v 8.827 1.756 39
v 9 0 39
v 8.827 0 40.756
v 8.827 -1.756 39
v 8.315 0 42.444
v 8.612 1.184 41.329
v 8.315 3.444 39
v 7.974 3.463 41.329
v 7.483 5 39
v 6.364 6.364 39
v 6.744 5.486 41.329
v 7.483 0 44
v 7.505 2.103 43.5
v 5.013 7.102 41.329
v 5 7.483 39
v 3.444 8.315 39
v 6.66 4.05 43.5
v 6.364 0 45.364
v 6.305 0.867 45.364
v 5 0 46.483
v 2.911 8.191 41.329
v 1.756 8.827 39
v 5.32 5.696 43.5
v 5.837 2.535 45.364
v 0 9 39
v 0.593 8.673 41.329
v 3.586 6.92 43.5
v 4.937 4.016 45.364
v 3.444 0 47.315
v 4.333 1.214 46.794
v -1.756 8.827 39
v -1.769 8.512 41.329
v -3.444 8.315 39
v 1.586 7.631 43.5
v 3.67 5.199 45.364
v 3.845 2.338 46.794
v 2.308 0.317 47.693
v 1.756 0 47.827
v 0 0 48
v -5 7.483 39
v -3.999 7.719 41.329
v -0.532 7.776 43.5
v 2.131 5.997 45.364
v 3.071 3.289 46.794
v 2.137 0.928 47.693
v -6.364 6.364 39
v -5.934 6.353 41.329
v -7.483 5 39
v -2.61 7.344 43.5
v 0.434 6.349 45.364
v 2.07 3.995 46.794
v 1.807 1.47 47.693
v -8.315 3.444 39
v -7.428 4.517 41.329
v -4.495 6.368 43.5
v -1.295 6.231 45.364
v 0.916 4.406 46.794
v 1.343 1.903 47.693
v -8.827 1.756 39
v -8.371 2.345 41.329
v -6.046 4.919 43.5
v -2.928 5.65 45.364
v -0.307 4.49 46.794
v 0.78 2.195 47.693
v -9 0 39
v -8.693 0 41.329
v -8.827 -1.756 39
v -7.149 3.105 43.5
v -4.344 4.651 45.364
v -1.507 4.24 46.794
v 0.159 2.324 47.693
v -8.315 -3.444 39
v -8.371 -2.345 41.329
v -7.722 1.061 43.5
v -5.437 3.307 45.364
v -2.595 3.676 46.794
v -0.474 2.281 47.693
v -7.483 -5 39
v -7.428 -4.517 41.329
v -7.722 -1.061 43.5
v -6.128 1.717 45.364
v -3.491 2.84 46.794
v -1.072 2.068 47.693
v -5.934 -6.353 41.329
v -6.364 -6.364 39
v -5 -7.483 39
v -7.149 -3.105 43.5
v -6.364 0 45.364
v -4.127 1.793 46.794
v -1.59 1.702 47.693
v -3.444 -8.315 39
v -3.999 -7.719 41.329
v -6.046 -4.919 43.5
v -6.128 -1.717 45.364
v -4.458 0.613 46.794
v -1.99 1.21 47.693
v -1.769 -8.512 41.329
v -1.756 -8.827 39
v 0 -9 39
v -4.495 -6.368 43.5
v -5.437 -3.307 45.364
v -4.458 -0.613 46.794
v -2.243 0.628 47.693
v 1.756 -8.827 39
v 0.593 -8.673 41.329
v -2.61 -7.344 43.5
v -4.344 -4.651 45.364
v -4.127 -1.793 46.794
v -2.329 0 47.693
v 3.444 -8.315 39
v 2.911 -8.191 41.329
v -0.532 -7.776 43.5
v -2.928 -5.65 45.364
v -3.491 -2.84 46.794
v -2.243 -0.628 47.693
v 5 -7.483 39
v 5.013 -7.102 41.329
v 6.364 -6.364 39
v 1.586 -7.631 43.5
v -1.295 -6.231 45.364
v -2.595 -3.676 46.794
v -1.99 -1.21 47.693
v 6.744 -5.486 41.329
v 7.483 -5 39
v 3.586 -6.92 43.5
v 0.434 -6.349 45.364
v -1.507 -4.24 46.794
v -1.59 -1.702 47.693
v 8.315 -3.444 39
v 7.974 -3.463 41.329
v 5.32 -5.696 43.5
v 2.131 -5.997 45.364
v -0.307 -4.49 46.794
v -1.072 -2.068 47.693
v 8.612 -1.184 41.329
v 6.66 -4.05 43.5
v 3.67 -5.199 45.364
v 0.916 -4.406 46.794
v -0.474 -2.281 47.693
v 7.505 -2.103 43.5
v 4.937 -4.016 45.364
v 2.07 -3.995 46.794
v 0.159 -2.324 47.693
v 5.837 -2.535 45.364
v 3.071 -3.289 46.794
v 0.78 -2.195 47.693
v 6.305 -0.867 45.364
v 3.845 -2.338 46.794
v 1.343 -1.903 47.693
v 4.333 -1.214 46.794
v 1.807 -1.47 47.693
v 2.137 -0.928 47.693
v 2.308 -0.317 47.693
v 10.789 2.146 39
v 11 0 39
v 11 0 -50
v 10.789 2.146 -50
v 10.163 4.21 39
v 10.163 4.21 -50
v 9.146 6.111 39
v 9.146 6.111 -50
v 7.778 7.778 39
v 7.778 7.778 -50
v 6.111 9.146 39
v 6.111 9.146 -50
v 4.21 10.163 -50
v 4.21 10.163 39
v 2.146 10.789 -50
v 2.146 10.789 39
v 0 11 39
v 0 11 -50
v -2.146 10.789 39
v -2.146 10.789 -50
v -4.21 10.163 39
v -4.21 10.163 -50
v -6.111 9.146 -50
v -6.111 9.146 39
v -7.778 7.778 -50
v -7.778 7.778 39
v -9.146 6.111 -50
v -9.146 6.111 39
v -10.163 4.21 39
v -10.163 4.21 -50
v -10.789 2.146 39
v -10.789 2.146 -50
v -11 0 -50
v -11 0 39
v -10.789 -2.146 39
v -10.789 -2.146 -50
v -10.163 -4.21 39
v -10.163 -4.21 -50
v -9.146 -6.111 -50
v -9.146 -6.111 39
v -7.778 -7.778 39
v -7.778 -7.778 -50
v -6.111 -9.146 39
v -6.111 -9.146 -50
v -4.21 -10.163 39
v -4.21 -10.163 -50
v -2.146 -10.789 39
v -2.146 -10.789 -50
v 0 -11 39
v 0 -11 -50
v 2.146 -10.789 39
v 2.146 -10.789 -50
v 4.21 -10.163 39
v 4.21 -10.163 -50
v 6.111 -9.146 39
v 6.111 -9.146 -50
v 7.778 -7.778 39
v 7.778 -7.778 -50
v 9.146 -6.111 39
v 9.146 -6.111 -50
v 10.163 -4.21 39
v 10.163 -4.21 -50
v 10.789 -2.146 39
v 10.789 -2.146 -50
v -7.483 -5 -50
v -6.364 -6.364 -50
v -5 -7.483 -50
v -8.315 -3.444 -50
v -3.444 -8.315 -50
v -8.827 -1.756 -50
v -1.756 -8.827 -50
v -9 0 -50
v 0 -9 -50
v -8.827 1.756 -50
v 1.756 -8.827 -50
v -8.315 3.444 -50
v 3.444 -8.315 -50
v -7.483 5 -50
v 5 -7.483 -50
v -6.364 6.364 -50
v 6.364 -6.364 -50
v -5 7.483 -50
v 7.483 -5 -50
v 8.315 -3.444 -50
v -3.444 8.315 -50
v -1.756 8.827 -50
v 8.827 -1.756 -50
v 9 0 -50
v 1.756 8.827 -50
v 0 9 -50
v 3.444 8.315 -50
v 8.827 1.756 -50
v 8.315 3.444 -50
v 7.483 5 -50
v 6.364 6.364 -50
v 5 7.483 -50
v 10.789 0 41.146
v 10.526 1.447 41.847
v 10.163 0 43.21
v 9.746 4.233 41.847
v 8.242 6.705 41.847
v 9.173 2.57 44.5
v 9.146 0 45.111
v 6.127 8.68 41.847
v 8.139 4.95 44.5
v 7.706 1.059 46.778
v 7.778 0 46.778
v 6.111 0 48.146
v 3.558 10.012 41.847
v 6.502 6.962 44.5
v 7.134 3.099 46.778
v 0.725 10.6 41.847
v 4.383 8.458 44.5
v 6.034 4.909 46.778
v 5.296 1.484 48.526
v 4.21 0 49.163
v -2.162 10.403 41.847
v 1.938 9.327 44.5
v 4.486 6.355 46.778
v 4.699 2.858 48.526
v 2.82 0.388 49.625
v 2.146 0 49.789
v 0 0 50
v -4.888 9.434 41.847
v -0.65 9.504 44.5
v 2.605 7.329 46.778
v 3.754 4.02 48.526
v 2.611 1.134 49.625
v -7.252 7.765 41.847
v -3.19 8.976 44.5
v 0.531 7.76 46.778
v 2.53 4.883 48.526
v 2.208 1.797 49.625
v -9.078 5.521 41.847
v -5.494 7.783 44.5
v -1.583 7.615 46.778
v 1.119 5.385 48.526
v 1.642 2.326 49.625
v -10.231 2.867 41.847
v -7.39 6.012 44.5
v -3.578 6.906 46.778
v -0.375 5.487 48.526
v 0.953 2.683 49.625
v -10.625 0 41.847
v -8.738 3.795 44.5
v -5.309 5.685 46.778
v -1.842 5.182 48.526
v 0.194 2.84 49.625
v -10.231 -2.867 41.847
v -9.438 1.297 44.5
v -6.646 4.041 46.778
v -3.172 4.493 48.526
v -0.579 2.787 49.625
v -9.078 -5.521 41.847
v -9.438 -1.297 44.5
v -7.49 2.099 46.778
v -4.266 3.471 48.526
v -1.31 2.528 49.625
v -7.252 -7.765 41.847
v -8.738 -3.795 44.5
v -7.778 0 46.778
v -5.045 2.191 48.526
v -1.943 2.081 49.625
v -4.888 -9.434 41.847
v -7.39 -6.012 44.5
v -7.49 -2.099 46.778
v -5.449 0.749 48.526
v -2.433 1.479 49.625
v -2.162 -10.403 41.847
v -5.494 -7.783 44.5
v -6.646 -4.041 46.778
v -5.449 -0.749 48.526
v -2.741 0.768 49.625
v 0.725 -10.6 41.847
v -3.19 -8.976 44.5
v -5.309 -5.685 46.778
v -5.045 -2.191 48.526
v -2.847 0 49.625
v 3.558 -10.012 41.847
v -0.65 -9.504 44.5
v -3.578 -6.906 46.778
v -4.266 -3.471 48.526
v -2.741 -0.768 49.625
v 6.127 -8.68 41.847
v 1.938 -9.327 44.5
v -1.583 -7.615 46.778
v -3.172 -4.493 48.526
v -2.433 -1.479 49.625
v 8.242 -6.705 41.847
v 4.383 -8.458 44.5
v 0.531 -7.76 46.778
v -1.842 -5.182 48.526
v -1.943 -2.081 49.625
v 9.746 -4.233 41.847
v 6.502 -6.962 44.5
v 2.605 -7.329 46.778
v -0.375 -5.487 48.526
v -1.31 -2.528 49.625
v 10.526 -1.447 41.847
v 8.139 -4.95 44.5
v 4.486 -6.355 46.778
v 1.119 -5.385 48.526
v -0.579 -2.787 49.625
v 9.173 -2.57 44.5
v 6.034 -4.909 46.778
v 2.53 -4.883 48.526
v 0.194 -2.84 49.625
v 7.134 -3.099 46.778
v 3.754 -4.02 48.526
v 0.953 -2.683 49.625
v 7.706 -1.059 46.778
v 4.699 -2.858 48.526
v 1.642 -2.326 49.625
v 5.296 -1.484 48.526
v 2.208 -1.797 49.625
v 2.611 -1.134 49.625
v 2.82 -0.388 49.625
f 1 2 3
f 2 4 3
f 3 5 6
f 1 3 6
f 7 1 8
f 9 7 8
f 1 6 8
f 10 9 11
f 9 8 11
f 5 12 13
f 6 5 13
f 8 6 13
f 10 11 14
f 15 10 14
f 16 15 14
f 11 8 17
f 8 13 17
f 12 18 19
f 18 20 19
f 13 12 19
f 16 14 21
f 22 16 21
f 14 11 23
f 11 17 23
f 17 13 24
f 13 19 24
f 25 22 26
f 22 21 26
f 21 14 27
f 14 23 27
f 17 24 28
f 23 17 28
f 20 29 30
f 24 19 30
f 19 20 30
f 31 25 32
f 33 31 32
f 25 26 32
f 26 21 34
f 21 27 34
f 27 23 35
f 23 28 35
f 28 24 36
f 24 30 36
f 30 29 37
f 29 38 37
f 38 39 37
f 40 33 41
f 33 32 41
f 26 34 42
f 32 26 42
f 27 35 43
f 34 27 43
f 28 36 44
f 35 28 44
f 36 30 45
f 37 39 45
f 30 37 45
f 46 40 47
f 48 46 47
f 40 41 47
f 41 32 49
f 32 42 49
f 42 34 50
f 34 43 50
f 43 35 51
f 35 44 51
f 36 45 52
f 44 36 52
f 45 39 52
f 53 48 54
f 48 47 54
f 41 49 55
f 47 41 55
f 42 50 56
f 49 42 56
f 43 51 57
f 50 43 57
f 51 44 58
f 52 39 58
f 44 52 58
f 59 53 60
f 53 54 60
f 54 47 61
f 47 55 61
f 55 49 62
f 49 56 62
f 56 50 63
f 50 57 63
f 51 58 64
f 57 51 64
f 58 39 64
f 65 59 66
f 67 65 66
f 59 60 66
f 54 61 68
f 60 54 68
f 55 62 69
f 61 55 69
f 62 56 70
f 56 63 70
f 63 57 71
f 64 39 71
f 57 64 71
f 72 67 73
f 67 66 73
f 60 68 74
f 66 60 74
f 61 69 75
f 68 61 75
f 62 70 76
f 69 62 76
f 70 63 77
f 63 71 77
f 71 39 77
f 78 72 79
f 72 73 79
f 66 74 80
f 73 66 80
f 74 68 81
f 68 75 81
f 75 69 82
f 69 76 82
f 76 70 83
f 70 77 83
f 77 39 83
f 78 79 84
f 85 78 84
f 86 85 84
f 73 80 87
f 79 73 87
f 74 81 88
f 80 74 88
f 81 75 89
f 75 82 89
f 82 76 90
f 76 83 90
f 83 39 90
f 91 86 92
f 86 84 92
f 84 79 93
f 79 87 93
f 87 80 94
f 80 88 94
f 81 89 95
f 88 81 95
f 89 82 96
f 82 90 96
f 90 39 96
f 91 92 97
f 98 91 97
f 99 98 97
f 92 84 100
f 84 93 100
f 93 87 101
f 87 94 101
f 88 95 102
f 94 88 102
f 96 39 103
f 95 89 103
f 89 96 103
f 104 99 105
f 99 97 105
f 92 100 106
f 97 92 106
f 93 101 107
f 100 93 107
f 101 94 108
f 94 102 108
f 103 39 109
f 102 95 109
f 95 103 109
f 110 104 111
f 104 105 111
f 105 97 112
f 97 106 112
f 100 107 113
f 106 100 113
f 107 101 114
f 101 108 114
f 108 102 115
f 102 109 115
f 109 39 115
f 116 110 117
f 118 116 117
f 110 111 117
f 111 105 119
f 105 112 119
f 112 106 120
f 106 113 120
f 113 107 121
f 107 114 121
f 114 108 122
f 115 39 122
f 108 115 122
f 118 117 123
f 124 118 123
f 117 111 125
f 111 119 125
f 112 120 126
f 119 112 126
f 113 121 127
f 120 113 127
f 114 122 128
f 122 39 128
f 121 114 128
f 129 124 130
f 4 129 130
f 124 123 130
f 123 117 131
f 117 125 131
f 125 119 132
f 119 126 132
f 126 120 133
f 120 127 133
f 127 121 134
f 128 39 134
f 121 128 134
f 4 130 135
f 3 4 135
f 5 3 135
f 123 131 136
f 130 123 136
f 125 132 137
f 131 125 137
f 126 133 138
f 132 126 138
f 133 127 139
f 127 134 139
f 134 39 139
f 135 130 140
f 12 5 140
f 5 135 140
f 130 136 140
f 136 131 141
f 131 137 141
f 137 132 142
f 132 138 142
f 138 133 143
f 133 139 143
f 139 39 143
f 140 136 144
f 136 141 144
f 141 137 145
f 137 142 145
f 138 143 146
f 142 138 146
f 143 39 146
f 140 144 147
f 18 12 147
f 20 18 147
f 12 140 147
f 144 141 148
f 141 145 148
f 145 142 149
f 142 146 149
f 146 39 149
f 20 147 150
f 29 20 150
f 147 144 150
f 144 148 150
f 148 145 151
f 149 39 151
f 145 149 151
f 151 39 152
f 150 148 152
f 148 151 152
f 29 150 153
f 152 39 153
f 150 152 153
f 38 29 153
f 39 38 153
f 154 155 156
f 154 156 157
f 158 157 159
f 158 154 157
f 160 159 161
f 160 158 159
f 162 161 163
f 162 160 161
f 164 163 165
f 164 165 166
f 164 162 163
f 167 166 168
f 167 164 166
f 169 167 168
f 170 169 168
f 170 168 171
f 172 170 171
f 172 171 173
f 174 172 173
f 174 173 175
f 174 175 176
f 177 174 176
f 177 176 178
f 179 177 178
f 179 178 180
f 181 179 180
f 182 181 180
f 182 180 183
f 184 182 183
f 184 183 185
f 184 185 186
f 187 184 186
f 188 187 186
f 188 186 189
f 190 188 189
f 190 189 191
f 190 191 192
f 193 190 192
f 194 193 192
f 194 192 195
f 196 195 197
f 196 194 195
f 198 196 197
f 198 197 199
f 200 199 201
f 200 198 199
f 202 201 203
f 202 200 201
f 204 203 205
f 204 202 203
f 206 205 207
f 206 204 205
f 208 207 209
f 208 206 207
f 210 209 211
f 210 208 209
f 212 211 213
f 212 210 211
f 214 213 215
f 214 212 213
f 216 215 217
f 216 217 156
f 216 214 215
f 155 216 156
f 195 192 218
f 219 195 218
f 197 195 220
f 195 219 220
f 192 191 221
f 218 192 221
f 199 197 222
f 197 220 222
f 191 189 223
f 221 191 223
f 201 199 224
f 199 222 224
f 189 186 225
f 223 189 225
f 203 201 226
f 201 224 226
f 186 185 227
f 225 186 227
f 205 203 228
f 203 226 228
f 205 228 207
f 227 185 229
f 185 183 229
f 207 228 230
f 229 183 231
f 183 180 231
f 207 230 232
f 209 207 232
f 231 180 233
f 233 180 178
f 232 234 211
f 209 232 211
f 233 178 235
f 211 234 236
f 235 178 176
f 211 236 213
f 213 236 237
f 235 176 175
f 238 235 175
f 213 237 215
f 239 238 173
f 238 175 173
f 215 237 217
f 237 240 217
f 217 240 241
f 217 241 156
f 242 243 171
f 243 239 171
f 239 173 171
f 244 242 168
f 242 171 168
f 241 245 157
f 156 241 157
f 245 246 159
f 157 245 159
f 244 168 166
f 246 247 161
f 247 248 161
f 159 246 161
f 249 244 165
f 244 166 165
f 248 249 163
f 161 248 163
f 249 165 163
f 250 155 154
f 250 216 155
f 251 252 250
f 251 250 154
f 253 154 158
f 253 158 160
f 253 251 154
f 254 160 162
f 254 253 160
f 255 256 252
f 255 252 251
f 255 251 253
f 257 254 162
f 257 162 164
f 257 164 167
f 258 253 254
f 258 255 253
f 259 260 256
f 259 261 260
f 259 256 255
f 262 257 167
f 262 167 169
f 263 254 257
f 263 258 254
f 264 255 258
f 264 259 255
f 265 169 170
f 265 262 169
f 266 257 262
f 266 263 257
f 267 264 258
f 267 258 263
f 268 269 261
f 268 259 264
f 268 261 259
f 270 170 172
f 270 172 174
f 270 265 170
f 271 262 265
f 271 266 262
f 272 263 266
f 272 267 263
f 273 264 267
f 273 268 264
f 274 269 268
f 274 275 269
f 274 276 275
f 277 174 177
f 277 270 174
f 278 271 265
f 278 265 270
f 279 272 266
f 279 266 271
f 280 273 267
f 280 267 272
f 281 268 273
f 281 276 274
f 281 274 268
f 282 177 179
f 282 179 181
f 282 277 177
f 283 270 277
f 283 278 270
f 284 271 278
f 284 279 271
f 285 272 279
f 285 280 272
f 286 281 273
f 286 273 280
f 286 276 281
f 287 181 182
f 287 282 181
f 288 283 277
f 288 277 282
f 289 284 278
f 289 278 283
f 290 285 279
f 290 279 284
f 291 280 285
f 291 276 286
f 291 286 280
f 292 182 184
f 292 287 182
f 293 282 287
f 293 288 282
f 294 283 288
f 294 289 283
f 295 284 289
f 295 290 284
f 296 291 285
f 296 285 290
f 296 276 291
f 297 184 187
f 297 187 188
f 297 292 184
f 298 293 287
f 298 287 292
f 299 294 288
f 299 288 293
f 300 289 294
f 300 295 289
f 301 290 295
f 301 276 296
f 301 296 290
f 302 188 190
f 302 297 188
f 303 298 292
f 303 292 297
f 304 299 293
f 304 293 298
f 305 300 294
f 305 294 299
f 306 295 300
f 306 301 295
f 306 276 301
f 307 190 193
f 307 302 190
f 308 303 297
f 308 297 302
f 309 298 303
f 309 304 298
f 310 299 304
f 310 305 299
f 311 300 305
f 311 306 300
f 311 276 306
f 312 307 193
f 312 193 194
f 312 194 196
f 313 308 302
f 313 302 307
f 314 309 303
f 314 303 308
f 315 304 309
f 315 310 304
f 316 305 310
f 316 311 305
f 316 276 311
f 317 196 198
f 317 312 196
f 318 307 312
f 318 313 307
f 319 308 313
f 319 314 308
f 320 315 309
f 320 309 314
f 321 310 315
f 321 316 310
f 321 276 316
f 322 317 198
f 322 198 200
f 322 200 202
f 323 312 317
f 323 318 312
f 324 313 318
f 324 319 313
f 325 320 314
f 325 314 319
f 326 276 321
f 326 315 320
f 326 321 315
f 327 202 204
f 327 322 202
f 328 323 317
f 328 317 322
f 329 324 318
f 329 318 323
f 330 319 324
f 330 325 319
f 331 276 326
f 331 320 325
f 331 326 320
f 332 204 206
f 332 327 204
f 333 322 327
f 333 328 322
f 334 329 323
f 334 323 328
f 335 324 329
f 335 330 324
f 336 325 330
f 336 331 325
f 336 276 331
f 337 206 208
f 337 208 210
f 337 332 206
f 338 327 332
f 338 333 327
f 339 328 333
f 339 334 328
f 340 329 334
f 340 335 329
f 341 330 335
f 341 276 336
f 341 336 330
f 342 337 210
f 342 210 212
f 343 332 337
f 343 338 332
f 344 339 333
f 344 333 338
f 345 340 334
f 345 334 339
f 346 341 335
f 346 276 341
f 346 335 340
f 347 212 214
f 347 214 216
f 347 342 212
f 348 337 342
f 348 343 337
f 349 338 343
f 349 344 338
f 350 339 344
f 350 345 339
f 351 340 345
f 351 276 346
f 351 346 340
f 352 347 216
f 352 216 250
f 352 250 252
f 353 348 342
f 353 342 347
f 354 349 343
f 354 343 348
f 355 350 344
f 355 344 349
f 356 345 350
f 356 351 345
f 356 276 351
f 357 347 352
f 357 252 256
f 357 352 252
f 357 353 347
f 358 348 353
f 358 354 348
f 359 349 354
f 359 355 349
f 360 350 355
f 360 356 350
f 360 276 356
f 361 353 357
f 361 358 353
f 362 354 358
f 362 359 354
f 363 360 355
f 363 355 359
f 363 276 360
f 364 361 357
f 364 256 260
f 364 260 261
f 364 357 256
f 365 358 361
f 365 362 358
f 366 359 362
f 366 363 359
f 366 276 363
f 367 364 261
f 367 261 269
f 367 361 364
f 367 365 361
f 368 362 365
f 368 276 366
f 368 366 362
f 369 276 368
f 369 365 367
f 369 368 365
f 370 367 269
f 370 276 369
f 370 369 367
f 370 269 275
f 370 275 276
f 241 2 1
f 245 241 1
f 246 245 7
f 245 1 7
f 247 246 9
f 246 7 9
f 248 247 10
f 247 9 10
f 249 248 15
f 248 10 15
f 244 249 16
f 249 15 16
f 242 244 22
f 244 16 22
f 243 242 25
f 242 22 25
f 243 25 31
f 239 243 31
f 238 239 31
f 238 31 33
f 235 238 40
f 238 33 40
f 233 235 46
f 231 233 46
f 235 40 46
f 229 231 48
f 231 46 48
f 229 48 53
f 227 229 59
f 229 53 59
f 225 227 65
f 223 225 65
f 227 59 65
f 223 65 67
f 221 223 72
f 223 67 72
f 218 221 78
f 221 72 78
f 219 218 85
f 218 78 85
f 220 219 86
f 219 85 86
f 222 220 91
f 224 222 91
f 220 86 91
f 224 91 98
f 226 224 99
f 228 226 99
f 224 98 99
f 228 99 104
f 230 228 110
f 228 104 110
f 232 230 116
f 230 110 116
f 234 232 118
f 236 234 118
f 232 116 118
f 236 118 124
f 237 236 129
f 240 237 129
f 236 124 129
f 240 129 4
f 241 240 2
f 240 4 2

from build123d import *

# Parameters (mm, degrees)
F0_R     = 11
F1_DEPTH = 50
F2_R     = 11
F3_T     = -2


with BuildPart() as f1:
    # F0 (on Top) → F1 (new body, symmetric)
    with BuildSketch(Plane.XY):
        Circle(F0_R)
    extrude(amount=F1_DEPTH, both=True)

    # F2
    f2_edges = [f1.edges().sort_by_distance(p)[0] for p in [
        (-11, 0, 50),
    ]]
    fillet(f2_edges, radius=F2_R)

    # F3
    f3_openings = [f1.faces().sort_by_distance(p)[0] for p in [
        (0, 0, -50),
    ]]
    offset(amount=F3_T, openings=f3_openings)


solid = f1.part
